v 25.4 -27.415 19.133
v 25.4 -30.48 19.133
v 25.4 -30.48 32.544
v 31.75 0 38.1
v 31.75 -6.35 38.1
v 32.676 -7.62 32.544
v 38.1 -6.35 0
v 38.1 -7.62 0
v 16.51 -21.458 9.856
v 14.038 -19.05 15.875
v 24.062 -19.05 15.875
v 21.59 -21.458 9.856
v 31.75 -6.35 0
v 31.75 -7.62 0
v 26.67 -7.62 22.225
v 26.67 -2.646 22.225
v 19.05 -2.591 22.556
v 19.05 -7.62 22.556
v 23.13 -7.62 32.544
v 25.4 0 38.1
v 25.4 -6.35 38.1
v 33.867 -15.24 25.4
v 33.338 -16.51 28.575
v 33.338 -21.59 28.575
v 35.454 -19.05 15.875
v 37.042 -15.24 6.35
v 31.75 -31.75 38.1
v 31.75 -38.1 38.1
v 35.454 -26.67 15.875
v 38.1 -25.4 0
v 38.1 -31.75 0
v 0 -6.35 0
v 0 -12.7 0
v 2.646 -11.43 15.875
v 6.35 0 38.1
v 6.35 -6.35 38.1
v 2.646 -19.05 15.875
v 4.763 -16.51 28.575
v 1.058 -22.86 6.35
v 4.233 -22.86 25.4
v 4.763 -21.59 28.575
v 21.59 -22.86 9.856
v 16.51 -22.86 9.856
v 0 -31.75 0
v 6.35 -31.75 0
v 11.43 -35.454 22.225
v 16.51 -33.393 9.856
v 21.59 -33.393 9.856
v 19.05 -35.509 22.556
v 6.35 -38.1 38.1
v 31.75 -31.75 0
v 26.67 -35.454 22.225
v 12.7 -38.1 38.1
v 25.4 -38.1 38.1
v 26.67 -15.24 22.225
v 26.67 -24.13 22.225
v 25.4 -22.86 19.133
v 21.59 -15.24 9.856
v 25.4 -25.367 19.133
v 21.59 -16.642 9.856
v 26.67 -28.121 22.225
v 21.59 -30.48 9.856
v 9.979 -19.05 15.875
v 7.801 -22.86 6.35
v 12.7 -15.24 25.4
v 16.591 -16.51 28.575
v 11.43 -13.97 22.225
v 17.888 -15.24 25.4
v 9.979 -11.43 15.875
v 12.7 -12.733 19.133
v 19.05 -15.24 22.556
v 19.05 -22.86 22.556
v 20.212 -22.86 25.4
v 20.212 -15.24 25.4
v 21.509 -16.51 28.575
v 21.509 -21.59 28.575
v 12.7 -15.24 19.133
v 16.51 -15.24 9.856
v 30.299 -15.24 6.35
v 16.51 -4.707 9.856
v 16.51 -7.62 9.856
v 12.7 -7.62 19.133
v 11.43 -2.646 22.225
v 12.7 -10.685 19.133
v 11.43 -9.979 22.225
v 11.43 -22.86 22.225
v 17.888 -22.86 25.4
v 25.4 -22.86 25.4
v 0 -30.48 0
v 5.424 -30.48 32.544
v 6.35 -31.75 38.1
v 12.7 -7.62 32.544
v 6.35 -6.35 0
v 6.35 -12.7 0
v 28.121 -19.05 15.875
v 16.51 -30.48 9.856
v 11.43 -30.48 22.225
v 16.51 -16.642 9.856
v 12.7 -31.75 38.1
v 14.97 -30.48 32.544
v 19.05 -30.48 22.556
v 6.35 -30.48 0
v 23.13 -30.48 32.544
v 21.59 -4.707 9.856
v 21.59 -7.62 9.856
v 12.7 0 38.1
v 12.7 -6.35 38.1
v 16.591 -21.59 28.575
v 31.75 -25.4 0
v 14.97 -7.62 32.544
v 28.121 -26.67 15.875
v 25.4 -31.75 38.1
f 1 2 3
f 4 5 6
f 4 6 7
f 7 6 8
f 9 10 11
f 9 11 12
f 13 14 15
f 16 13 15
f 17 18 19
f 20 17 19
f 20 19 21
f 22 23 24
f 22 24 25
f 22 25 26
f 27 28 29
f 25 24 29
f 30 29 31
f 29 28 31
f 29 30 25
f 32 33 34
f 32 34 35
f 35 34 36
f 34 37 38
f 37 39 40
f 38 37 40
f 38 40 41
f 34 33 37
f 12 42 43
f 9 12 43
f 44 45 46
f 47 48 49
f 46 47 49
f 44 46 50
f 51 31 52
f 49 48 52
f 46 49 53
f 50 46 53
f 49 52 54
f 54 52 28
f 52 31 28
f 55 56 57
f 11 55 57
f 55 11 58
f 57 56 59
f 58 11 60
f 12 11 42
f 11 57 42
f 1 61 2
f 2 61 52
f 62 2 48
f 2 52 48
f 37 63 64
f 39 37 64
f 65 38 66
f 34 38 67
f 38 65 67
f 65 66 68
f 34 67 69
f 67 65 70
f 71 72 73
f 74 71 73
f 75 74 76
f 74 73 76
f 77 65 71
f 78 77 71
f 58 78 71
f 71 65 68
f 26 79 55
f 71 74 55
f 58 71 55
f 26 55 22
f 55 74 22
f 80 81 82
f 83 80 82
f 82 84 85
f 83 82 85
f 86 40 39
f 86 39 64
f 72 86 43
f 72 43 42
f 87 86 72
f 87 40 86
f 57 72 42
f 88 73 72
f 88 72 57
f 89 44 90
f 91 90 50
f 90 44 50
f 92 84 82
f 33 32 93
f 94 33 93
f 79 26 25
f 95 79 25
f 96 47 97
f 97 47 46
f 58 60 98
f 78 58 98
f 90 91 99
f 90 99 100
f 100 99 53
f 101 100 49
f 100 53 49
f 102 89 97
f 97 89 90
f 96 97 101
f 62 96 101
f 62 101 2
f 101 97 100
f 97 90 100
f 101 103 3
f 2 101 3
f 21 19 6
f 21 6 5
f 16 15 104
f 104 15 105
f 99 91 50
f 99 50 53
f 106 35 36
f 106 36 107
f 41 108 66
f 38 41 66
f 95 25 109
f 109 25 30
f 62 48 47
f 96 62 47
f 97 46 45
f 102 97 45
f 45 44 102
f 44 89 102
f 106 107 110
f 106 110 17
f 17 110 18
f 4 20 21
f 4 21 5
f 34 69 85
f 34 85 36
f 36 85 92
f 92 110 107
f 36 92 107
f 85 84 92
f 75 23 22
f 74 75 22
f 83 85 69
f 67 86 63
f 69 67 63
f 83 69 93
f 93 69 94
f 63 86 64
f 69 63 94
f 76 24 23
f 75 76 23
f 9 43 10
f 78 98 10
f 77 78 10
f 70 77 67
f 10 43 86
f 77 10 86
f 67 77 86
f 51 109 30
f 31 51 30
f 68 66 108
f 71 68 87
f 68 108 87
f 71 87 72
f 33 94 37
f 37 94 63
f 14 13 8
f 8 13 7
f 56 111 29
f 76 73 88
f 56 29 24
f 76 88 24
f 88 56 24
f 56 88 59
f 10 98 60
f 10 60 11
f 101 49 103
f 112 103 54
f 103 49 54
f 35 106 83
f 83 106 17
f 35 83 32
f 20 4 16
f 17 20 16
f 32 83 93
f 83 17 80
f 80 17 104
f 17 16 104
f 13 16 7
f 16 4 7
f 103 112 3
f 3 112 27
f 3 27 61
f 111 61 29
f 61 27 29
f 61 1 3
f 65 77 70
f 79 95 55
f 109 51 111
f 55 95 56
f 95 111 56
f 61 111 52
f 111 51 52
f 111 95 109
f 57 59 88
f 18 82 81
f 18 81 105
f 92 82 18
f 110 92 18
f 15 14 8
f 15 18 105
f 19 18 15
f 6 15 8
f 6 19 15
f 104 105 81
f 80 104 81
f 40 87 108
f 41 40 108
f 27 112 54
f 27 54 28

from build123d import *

# Parameters (mm, degrees)
F0_W      = 38.1
F0_H      = 38.1
F1_DEPTH  = 38.1
F6_DEPTH  = 38.1
F8_DEPTH  = 38.1
F9_W      = 25.4
F9_H      = 7.62
F10_DEPTH = 38.1


with BuildPart() as f1:
    # F0 (on Front) → F1 (new body)
    with BuildSketch(Plane.XZ):
        with Locations((19.05, 19.05)):
            Rectangle(F0_W, F0_H)
    extrude(amount=F1_DEPTH)

    # F5 (on offset) → F6 (cut)
    with BuildSketch(Plane.YZ.offset(38.1)):
        Polygon((-11.43, 15.875), (-6.35, 38.1), (-31.75, 38.1), (-26.67, 15.875), (-21.59, 28.575), (-16.51, 28.575), align=None)
        Polygon((-38.1, 0), (-31.75, 0), (-38.1, 38.1), align=None)
        Polygon((-25.4, 0), (-12.7, 0), (-19.05, 15.875), align=None)
        Polygon((-6.35, 0), (0, 0), (0, 38.1), align=None)
    extrude(amount=-F6_DEPTH, mode=Mode.SUBTRACT)

    # F7 (on offset) → F8 (cut)
    with BuildSketch(Plane.XZ.offset(38.1)):
        Polygon((0, 38.1), (0, 0), (6.35, 38.1), align=None)
        Polygon((25.4, 38.1), (12.7, 38.1), (19.05, 22.555536744), align=None)
        Polygon((31.75, 38.1), (38.1, 0), (38.1, 38.1), align=None)
        Polygon((11.43, 22.225), (6.35, 0), (31.75, 0), (26.67, 22.225), (21.59, 9.855536744), (16.51, 9.855536744), align=None)
    extrude(amount=-F8_DEPTH, mode=Mode.SUBTRACT)

    # F9 (on offset) → F10 (cut)
    with BuildSketch(Plane.XY.offset(38.1)):
        with Locations((25.4, -11.43)):
            Rectangle(F9_W, F9_H)
        with Locations((12.7, -26.67)):
            Rectangle(F9_W, F9_H)
    extrude(amount=-F10_DEPTH, mode=Mode.SUBTRACT)


solid = f1.part
